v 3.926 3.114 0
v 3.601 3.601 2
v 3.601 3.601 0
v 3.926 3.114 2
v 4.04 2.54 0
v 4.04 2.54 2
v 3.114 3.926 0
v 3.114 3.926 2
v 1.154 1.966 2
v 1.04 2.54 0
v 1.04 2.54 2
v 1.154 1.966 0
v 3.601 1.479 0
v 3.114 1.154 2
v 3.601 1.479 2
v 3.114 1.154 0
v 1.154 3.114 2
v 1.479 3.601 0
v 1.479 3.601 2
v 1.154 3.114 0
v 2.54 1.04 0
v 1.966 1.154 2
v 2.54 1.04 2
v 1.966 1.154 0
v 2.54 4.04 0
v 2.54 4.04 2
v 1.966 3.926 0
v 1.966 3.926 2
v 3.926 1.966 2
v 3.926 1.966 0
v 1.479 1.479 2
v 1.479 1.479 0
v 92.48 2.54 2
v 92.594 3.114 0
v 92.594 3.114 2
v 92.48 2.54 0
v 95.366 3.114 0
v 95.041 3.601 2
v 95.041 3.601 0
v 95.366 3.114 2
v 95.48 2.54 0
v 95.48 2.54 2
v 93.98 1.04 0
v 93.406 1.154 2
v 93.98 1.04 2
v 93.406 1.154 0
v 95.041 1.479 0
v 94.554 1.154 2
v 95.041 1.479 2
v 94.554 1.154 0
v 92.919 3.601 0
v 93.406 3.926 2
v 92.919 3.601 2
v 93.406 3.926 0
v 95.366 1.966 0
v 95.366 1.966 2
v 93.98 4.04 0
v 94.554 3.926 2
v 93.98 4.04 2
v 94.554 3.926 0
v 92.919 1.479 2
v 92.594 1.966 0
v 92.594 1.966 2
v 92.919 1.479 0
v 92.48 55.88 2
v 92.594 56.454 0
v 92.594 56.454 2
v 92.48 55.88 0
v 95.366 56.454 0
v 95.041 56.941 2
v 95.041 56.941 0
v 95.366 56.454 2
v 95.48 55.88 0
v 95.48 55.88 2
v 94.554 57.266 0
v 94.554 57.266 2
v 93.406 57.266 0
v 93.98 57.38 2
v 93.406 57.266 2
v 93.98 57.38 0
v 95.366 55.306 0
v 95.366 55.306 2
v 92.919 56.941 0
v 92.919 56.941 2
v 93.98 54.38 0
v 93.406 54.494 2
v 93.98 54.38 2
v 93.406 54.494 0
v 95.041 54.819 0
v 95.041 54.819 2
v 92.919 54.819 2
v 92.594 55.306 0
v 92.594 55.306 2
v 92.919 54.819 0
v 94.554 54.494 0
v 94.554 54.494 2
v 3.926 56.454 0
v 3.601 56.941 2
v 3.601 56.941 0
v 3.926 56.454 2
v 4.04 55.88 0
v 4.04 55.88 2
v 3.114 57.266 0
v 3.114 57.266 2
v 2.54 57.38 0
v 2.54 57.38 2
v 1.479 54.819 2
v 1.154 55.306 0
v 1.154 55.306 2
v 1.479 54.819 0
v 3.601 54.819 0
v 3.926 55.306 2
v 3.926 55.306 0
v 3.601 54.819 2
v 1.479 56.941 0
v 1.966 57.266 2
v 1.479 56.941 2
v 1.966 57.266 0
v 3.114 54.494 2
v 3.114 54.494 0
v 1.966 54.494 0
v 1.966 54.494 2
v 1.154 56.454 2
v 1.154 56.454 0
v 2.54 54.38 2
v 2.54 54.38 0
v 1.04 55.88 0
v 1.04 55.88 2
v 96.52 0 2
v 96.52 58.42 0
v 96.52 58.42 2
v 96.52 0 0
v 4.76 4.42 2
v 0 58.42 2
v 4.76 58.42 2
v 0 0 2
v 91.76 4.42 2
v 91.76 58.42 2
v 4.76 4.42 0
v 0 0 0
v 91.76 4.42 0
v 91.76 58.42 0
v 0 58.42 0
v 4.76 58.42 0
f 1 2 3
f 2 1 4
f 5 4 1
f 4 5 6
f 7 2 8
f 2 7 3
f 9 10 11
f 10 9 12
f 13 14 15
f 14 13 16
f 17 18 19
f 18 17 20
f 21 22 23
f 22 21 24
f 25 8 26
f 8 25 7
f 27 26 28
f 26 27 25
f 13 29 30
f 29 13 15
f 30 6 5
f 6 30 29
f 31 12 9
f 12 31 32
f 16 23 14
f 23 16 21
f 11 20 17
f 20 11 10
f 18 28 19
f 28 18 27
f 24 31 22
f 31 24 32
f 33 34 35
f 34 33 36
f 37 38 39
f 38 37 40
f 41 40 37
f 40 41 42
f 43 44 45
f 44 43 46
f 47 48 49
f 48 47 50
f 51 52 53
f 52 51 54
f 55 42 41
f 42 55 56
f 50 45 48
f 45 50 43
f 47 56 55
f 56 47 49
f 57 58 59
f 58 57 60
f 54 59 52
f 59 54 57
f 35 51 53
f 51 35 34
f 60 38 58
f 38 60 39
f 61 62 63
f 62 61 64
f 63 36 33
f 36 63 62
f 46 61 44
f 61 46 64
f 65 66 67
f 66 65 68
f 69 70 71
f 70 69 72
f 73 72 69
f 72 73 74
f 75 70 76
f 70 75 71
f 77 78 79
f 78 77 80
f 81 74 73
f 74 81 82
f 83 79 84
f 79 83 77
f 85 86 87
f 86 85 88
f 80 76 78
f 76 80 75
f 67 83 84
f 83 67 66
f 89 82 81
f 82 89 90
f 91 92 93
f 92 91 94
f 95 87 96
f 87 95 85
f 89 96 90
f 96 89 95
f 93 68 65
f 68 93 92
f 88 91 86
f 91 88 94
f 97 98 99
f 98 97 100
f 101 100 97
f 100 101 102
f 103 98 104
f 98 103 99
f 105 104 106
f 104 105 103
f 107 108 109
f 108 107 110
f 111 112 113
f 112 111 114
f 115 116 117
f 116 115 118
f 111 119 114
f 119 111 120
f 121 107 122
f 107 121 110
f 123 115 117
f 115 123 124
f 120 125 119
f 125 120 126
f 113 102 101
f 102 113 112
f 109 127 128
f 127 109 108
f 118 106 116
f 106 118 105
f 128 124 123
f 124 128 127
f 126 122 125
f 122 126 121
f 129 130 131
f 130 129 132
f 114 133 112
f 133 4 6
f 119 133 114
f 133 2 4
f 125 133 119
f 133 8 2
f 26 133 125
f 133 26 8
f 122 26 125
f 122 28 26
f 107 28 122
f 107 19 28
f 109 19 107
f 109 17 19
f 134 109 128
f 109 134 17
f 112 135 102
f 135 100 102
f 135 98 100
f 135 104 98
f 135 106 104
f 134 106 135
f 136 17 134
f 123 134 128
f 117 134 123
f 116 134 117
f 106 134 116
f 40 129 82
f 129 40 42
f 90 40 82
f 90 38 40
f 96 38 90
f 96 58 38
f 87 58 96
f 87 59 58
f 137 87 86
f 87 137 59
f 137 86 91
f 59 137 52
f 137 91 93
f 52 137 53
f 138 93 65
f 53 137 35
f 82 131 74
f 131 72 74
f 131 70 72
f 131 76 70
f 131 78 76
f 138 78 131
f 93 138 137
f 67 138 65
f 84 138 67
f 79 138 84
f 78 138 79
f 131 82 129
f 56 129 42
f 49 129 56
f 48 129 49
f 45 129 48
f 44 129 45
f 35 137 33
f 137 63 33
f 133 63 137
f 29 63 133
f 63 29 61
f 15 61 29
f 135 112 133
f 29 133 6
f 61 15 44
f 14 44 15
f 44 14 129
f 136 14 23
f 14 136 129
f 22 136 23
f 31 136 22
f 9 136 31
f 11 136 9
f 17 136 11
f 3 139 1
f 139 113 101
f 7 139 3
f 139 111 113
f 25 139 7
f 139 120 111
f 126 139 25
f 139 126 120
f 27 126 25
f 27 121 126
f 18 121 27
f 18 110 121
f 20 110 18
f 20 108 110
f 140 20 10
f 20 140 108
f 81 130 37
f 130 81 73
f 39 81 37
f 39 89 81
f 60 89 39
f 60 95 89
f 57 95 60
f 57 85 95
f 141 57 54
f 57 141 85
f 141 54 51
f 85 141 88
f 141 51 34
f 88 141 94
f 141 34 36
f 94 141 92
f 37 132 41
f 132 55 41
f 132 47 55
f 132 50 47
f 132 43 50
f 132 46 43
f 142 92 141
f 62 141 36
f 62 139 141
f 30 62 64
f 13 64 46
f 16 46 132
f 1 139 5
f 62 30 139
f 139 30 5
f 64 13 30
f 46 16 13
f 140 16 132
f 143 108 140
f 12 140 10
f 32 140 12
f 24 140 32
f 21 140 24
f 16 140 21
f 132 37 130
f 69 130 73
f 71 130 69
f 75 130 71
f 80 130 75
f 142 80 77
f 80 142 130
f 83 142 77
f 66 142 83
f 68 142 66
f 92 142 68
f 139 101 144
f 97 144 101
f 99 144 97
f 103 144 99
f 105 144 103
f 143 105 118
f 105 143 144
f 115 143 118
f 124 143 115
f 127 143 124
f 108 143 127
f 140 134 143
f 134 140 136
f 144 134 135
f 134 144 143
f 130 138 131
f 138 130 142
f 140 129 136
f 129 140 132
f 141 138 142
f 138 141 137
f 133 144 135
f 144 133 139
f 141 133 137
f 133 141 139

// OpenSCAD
// file: card-pocket-upper.scad
include <metrics.scad>;

module CardPocketHoles(T){
    translate([   2.54,   2.54,-1])cylinder(T+2,1.5,1.5,$fn=16);
    translate([PW-2.54,   2.54,-1])cylinder(T+2,1.5,1.5,$fn=16);
    translate([PW-2.54,PH-2.54,-1])cylinder(T+2,1.5,1.5,$fn=16);
    translate([   2.54,PH-2.54,-1])cylinder(T+2,1.5,1.5,$fn=16);
}

module CardPocketUpper(){
    color("DeepSkyBlue",0.5)difference() {
        cube([PW,PH,PT]);
        CardPocketHoles(PT);
    }
}

CardPocketUpper();



echo(str("CardPocketUpper: ",PW,"x",PH,"x",PT,"mm"));
// file: metrics.scad
// CARD (https://www.ebay.de/itm/273026026604)
CW = 85.0;//mm card width   < 34 x 2.54
CH = 54.0;//mm card height  < 22 x 2.54 
CT =  0.9;//mm card thickness

// POCKET (https://www.hornbach.de/shop/Hobbyglas-2x250x500-mm-Glatt-klar/1477798/artikel.html)
PW = 38 * 2.54;//mm width
PH = 23 * 2.54;//mm height
PT =  1 * 2.00;//mm thickness
PP =  2 * 1.00;//mm pocket padding (left/right)

// PCB (https://www.ebay.de/itm/183729215412)
PCBH = PH + 8 * 2.54;//mm height
PCBT = 1.2;//mm thickness
PCBD = 0.5;//mm drillings radius

// FRONT
FW = 245;//mm WIDTH
FH = 140;//mm HEIGHT
FT =   5;//mm thickness
FS = 100;//mm SPEAKER DIAMETER
FB = 16; //mm BUTTON DIAMETER
// main file
include <metrics.scad>;

use <card-pocket-upper.scad>;

module CardPocketLower(){
    difference(){
        CardPocketUpper();
        //CUTOUT
        translate([(PW-CW-PP)/2,PH-CH,-1])cube([CW+2,CH+1,PT+PP]);
    }
}

CardPocketLower();

echo(str("CardPocketLower: ",PW,"x",PH,"x",PT,"mm"));
